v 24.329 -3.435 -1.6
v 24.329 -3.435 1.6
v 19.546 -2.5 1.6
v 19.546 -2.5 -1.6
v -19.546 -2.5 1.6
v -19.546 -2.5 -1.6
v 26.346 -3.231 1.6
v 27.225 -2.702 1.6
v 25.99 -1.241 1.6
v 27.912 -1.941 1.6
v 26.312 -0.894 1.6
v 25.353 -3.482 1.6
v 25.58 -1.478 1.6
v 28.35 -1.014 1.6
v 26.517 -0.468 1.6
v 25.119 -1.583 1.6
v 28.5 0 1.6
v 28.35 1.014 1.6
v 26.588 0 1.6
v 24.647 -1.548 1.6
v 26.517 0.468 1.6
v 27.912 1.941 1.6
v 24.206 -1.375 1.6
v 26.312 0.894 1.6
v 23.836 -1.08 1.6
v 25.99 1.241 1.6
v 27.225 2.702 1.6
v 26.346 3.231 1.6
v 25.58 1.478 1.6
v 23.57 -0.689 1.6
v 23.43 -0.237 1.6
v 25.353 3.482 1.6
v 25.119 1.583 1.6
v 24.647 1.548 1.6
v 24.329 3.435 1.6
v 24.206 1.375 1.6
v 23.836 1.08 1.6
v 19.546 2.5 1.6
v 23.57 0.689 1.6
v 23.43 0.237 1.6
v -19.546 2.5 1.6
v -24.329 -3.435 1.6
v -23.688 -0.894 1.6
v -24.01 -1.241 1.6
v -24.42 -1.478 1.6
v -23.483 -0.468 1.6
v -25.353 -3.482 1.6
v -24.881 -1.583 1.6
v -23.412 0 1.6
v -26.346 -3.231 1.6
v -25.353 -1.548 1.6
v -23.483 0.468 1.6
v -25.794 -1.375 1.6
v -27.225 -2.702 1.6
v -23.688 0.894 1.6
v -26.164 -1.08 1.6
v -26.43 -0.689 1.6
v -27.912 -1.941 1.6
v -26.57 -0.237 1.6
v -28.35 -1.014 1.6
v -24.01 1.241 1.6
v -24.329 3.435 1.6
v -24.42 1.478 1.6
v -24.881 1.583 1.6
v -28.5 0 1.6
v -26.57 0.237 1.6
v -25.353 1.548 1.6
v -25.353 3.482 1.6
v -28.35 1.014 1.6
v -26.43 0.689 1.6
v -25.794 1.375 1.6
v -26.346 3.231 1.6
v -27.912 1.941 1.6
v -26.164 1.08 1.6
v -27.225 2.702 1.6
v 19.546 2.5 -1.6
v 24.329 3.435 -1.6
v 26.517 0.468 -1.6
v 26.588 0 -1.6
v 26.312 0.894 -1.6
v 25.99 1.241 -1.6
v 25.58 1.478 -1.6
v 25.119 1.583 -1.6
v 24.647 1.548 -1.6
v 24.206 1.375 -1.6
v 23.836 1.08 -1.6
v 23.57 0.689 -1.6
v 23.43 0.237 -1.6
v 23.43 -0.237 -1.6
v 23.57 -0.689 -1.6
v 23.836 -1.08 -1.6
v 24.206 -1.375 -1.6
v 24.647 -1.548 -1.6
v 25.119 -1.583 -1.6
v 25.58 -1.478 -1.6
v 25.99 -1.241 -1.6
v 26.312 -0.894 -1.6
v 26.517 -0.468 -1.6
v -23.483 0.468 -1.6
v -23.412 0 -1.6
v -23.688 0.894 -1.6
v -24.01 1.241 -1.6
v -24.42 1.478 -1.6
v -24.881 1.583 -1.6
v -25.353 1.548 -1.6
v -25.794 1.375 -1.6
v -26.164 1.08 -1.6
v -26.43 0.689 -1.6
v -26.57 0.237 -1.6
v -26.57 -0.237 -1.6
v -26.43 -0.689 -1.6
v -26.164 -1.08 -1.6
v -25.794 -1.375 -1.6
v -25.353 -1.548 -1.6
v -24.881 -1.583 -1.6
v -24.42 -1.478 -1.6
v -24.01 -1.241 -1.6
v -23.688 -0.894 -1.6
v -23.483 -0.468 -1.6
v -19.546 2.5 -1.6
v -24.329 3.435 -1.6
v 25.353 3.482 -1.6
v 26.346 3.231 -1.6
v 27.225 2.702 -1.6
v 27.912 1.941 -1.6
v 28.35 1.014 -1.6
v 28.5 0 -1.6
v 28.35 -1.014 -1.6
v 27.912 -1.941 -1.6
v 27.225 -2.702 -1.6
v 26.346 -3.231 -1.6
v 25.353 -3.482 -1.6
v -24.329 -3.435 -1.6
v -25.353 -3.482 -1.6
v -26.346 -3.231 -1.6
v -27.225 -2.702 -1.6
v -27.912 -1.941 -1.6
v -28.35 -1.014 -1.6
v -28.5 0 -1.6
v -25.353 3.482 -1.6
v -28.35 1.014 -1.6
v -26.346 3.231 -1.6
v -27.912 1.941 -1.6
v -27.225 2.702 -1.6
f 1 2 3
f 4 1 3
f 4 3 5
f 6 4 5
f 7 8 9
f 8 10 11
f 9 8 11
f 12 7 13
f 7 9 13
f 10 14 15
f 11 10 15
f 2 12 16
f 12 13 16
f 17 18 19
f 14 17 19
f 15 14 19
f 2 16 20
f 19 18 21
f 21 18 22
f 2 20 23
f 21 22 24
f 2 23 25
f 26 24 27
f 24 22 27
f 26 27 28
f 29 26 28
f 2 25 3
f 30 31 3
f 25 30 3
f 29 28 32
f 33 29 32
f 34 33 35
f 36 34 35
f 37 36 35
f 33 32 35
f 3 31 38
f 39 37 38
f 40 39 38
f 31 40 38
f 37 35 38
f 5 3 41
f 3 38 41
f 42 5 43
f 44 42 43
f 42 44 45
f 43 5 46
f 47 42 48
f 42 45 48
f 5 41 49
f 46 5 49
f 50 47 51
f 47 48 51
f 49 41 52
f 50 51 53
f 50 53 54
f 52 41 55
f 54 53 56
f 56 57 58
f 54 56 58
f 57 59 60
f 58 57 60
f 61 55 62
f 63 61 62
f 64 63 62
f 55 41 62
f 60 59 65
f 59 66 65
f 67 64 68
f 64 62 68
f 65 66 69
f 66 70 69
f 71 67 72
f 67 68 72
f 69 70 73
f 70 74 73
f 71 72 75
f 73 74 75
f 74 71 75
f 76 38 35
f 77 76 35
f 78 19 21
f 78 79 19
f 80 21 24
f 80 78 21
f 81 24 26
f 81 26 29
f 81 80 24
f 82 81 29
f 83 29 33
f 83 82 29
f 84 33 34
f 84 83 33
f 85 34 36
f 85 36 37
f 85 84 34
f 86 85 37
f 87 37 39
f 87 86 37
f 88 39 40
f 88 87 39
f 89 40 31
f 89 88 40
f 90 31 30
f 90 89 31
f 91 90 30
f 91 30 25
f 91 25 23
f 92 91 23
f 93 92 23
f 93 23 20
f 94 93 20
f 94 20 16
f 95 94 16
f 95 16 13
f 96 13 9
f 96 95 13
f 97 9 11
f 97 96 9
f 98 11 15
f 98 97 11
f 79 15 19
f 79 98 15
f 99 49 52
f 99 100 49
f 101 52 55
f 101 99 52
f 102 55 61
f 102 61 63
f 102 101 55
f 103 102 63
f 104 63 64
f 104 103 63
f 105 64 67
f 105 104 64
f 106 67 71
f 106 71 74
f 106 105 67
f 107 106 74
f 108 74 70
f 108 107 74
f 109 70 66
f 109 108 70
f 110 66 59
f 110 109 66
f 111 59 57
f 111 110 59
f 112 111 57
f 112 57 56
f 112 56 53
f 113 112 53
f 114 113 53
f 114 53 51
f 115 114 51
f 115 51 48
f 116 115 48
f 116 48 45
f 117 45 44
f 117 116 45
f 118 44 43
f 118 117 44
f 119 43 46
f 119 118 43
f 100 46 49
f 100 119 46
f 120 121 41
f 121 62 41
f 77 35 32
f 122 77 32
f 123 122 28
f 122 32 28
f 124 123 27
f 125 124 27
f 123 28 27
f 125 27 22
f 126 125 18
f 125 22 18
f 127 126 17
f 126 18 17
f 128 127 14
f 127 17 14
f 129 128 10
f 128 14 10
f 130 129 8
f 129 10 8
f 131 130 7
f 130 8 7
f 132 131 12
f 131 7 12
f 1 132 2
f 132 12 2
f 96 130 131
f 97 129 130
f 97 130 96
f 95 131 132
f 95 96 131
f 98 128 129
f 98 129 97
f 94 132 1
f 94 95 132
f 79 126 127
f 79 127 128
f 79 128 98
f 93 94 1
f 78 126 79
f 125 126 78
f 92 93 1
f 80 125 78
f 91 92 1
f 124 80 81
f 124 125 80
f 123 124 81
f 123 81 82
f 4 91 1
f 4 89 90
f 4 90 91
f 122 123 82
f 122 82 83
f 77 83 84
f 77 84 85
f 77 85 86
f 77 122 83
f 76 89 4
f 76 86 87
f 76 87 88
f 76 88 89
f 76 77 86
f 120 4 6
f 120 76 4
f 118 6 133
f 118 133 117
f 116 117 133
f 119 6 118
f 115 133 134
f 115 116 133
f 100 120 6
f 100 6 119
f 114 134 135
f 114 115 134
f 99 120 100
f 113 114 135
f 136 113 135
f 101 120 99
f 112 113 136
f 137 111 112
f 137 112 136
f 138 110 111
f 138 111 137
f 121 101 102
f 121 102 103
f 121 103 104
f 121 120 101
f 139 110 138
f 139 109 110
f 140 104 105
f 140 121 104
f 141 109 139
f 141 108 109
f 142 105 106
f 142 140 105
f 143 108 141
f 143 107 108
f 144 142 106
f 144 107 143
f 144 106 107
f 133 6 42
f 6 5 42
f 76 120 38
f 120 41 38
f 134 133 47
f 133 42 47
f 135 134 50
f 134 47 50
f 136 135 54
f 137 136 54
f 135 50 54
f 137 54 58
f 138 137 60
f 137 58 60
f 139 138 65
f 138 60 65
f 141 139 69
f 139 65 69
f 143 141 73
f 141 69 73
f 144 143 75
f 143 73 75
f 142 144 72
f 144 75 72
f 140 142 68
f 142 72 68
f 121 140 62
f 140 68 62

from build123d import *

# Parameters (mm, degrees)
SKETCH1_R           = 1.5875
BOSS_EXTRUDE1_DEPTH = 1.6


with BuildPart() as part:
    # Sketch1 → Boss-Extrude1 (new, symmetric)
    with BuildSketch(Plane.XY):
        with BuildLine():
            Line((19.545643943, -2.5), (-19.545643943, -2.5))
            Line((-19.545643943, -2.5), (-24.328510099, -3.434981996))
            ThreePointArc((-24.328510099, -3.434981996), (-28.5, 0), (-24.328510099, 3.434981996))
            Line((-24.328510099, 3.434981996), (-19.545643943, 2.5))
            Line((-19.545643943, 2.5), (19.545643943, 2.5))
            Line((19.545643943, 2.5), (24.328510099, 3.434981996))
            ThreePointArc((24.328510099, 3.434981996), (28.5, 0), (24.328510099, -3.434981996))
            Line((24.328510099, -3.434981996), (19.545643943, -2.5))
        make_face()
        with Locations((-25, 0)):
            Circle(SKETCH1_R, mode=Mode.SUBTRACT)
        with Locations((25, 0)):
            Circle(SKETCH1_R, mode=Mode.SUBTRACT)
    extrude(amount=BOSS_EXTRUDE1_DEPTH, both=True)


solid = part.part
